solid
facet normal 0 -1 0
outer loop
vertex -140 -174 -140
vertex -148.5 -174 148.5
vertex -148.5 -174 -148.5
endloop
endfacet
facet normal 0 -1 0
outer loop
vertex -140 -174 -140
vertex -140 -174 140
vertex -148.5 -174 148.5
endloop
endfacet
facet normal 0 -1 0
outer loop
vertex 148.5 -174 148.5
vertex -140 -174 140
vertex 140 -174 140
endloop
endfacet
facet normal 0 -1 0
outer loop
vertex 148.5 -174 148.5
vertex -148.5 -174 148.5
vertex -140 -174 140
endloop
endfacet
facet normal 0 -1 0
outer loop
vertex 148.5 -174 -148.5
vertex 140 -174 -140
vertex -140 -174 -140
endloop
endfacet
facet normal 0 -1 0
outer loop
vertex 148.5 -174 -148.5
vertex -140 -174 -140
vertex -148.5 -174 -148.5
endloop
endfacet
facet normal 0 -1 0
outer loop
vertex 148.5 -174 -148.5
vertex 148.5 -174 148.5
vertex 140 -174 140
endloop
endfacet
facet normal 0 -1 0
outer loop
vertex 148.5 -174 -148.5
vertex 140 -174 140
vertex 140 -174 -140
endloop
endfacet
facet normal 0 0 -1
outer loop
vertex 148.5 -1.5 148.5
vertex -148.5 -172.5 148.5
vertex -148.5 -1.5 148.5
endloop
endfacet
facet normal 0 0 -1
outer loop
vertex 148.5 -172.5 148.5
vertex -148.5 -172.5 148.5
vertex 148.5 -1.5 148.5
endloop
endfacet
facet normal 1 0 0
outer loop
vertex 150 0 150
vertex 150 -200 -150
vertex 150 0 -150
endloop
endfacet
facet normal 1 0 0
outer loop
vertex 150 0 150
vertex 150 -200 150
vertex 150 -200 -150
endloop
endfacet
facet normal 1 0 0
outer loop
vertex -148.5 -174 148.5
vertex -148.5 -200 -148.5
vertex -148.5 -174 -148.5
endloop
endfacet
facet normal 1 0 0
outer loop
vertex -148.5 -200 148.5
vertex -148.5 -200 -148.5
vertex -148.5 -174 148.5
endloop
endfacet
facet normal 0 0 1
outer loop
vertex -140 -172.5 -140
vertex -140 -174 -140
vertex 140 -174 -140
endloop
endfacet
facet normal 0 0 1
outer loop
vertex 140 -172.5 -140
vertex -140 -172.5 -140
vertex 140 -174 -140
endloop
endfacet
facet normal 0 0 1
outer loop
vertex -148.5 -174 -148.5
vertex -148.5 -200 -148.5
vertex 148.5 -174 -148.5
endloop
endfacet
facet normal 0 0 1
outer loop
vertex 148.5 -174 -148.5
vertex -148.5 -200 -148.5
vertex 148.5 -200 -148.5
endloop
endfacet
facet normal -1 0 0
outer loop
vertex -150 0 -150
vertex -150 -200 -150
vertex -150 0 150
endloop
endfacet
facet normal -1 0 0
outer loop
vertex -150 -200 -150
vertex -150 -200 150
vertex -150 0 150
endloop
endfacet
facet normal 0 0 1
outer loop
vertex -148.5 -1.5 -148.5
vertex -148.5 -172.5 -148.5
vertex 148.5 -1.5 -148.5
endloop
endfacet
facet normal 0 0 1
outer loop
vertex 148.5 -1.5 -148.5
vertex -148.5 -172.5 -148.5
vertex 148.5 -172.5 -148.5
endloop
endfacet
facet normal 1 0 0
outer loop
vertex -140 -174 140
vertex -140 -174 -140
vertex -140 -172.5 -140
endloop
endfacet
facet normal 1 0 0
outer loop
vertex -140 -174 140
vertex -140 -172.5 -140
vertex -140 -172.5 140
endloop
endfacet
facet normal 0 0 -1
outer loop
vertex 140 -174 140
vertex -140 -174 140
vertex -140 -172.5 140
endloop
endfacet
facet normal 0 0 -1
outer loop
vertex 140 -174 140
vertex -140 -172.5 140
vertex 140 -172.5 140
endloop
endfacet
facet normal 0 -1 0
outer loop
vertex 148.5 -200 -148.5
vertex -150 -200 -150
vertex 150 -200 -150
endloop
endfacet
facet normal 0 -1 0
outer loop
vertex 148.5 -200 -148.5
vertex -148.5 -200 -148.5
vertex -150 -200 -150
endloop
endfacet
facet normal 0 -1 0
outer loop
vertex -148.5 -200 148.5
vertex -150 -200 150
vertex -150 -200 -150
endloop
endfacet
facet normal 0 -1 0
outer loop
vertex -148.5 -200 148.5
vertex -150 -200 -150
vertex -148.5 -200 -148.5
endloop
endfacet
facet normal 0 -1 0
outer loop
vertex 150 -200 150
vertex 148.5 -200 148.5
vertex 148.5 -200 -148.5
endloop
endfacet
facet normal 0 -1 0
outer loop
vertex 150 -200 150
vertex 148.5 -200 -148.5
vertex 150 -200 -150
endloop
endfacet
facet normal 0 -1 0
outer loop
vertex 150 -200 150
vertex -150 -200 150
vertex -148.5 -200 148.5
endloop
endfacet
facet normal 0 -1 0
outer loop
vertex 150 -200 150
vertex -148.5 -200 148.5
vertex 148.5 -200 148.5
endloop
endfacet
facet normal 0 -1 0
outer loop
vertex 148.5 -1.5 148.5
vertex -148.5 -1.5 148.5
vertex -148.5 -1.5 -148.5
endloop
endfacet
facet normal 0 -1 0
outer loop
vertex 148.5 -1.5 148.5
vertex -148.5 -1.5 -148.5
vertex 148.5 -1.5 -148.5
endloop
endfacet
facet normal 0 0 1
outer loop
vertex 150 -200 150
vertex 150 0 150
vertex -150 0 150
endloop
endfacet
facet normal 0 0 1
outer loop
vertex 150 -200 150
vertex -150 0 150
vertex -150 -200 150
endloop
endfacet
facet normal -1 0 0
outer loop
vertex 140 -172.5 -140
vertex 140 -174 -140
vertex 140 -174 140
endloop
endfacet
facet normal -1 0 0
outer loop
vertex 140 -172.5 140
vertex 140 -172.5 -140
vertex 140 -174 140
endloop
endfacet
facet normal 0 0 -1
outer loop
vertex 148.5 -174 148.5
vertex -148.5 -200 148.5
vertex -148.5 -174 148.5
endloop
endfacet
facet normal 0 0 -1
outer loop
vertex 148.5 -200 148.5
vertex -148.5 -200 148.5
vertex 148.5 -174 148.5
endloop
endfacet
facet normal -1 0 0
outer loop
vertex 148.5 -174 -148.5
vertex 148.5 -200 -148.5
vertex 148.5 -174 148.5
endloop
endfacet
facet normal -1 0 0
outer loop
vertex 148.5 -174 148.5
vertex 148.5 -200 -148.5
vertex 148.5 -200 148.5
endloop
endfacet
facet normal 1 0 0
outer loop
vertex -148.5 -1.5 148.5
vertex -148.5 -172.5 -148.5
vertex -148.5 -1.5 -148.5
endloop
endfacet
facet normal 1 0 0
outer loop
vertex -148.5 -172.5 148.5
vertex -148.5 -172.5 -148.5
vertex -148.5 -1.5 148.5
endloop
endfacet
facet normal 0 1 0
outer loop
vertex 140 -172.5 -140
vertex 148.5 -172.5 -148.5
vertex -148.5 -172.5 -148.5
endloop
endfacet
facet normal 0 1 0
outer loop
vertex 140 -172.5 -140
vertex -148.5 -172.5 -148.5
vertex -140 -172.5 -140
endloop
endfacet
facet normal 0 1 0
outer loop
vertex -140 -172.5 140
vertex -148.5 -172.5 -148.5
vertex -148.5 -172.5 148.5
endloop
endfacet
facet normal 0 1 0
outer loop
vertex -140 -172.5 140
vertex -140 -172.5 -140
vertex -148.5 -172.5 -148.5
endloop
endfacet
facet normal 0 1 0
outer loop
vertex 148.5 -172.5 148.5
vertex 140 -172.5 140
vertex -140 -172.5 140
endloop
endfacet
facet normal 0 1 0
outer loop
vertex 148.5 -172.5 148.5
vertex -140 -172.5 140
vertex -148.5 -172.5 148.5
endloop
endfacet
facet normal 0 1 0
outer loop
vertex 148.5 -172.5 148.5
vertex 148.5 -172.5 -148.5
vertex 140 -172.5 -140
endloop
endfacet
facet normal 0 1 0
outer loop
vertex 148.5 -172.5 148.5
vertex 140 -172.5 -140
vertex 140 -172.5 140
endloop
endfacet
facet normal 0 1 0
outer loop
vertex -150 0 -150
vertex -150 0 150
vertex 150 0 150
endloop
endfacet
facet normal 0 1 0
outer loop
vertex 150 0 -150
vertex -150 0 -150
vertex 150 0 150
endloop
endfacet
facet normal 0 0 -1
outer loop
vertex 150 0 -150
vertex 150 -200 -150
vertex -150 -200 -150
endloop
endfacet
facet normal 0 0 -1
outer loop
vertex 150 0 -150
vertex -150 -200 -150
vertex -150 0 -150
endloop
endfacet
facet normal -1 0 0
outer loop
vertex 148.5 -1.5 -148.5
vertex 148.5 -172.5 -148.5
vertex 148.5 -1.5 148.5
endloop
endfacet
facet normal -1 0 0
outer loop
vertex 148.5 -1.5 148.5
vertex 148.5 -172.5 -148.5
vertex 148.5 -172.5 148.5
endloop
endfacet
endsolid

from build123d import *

# Parameters (mm, degrees)
F0_W     = 300
F0_H     = 300
F1_DEPTH = 200
F2_W     = 297
F2_H     = 297
F3_DEPTH = 198.5
F5_DEPTH = 300
F6_W     = 280
F6_H     = 280
F7_DEPTH = 25


with BuildPart() as f1:
    # F0 (on Front) → F1 (new body)
    with BuildSketch(Plane.XZ):
        Rectangle(F0_W, F0_H)
    extrude(amount=F1_DEPTH)

    # F2 (on face) → F3 (cut)
    with BuildSketch(Plane.XZ.offset(200)):
        Rectangle(F2_W, F2_H)
    extrude(amount=-F3_DEPTH, mode=Mode.SUBTRACT)

    # F4 (on face) → F5 (join)
    with BuildSketch(Plane.YZ.offset(150)):
        Polygon((-174, 150), (-174, 0), (-174, -150), (-172.5, -150), (-172.5, 150), align=None)
    extrude(amount=-F5_DEPTH)

    # F6 (on face) → F7 (cut)
    with BuildSketch(Plane.XZ.offset(174)):
        Rectangle(F6_W, F6_H)
    extrude(amount=-F7_DEPTH, mode=Mode.SUBTRACT)


solid = f1.part
